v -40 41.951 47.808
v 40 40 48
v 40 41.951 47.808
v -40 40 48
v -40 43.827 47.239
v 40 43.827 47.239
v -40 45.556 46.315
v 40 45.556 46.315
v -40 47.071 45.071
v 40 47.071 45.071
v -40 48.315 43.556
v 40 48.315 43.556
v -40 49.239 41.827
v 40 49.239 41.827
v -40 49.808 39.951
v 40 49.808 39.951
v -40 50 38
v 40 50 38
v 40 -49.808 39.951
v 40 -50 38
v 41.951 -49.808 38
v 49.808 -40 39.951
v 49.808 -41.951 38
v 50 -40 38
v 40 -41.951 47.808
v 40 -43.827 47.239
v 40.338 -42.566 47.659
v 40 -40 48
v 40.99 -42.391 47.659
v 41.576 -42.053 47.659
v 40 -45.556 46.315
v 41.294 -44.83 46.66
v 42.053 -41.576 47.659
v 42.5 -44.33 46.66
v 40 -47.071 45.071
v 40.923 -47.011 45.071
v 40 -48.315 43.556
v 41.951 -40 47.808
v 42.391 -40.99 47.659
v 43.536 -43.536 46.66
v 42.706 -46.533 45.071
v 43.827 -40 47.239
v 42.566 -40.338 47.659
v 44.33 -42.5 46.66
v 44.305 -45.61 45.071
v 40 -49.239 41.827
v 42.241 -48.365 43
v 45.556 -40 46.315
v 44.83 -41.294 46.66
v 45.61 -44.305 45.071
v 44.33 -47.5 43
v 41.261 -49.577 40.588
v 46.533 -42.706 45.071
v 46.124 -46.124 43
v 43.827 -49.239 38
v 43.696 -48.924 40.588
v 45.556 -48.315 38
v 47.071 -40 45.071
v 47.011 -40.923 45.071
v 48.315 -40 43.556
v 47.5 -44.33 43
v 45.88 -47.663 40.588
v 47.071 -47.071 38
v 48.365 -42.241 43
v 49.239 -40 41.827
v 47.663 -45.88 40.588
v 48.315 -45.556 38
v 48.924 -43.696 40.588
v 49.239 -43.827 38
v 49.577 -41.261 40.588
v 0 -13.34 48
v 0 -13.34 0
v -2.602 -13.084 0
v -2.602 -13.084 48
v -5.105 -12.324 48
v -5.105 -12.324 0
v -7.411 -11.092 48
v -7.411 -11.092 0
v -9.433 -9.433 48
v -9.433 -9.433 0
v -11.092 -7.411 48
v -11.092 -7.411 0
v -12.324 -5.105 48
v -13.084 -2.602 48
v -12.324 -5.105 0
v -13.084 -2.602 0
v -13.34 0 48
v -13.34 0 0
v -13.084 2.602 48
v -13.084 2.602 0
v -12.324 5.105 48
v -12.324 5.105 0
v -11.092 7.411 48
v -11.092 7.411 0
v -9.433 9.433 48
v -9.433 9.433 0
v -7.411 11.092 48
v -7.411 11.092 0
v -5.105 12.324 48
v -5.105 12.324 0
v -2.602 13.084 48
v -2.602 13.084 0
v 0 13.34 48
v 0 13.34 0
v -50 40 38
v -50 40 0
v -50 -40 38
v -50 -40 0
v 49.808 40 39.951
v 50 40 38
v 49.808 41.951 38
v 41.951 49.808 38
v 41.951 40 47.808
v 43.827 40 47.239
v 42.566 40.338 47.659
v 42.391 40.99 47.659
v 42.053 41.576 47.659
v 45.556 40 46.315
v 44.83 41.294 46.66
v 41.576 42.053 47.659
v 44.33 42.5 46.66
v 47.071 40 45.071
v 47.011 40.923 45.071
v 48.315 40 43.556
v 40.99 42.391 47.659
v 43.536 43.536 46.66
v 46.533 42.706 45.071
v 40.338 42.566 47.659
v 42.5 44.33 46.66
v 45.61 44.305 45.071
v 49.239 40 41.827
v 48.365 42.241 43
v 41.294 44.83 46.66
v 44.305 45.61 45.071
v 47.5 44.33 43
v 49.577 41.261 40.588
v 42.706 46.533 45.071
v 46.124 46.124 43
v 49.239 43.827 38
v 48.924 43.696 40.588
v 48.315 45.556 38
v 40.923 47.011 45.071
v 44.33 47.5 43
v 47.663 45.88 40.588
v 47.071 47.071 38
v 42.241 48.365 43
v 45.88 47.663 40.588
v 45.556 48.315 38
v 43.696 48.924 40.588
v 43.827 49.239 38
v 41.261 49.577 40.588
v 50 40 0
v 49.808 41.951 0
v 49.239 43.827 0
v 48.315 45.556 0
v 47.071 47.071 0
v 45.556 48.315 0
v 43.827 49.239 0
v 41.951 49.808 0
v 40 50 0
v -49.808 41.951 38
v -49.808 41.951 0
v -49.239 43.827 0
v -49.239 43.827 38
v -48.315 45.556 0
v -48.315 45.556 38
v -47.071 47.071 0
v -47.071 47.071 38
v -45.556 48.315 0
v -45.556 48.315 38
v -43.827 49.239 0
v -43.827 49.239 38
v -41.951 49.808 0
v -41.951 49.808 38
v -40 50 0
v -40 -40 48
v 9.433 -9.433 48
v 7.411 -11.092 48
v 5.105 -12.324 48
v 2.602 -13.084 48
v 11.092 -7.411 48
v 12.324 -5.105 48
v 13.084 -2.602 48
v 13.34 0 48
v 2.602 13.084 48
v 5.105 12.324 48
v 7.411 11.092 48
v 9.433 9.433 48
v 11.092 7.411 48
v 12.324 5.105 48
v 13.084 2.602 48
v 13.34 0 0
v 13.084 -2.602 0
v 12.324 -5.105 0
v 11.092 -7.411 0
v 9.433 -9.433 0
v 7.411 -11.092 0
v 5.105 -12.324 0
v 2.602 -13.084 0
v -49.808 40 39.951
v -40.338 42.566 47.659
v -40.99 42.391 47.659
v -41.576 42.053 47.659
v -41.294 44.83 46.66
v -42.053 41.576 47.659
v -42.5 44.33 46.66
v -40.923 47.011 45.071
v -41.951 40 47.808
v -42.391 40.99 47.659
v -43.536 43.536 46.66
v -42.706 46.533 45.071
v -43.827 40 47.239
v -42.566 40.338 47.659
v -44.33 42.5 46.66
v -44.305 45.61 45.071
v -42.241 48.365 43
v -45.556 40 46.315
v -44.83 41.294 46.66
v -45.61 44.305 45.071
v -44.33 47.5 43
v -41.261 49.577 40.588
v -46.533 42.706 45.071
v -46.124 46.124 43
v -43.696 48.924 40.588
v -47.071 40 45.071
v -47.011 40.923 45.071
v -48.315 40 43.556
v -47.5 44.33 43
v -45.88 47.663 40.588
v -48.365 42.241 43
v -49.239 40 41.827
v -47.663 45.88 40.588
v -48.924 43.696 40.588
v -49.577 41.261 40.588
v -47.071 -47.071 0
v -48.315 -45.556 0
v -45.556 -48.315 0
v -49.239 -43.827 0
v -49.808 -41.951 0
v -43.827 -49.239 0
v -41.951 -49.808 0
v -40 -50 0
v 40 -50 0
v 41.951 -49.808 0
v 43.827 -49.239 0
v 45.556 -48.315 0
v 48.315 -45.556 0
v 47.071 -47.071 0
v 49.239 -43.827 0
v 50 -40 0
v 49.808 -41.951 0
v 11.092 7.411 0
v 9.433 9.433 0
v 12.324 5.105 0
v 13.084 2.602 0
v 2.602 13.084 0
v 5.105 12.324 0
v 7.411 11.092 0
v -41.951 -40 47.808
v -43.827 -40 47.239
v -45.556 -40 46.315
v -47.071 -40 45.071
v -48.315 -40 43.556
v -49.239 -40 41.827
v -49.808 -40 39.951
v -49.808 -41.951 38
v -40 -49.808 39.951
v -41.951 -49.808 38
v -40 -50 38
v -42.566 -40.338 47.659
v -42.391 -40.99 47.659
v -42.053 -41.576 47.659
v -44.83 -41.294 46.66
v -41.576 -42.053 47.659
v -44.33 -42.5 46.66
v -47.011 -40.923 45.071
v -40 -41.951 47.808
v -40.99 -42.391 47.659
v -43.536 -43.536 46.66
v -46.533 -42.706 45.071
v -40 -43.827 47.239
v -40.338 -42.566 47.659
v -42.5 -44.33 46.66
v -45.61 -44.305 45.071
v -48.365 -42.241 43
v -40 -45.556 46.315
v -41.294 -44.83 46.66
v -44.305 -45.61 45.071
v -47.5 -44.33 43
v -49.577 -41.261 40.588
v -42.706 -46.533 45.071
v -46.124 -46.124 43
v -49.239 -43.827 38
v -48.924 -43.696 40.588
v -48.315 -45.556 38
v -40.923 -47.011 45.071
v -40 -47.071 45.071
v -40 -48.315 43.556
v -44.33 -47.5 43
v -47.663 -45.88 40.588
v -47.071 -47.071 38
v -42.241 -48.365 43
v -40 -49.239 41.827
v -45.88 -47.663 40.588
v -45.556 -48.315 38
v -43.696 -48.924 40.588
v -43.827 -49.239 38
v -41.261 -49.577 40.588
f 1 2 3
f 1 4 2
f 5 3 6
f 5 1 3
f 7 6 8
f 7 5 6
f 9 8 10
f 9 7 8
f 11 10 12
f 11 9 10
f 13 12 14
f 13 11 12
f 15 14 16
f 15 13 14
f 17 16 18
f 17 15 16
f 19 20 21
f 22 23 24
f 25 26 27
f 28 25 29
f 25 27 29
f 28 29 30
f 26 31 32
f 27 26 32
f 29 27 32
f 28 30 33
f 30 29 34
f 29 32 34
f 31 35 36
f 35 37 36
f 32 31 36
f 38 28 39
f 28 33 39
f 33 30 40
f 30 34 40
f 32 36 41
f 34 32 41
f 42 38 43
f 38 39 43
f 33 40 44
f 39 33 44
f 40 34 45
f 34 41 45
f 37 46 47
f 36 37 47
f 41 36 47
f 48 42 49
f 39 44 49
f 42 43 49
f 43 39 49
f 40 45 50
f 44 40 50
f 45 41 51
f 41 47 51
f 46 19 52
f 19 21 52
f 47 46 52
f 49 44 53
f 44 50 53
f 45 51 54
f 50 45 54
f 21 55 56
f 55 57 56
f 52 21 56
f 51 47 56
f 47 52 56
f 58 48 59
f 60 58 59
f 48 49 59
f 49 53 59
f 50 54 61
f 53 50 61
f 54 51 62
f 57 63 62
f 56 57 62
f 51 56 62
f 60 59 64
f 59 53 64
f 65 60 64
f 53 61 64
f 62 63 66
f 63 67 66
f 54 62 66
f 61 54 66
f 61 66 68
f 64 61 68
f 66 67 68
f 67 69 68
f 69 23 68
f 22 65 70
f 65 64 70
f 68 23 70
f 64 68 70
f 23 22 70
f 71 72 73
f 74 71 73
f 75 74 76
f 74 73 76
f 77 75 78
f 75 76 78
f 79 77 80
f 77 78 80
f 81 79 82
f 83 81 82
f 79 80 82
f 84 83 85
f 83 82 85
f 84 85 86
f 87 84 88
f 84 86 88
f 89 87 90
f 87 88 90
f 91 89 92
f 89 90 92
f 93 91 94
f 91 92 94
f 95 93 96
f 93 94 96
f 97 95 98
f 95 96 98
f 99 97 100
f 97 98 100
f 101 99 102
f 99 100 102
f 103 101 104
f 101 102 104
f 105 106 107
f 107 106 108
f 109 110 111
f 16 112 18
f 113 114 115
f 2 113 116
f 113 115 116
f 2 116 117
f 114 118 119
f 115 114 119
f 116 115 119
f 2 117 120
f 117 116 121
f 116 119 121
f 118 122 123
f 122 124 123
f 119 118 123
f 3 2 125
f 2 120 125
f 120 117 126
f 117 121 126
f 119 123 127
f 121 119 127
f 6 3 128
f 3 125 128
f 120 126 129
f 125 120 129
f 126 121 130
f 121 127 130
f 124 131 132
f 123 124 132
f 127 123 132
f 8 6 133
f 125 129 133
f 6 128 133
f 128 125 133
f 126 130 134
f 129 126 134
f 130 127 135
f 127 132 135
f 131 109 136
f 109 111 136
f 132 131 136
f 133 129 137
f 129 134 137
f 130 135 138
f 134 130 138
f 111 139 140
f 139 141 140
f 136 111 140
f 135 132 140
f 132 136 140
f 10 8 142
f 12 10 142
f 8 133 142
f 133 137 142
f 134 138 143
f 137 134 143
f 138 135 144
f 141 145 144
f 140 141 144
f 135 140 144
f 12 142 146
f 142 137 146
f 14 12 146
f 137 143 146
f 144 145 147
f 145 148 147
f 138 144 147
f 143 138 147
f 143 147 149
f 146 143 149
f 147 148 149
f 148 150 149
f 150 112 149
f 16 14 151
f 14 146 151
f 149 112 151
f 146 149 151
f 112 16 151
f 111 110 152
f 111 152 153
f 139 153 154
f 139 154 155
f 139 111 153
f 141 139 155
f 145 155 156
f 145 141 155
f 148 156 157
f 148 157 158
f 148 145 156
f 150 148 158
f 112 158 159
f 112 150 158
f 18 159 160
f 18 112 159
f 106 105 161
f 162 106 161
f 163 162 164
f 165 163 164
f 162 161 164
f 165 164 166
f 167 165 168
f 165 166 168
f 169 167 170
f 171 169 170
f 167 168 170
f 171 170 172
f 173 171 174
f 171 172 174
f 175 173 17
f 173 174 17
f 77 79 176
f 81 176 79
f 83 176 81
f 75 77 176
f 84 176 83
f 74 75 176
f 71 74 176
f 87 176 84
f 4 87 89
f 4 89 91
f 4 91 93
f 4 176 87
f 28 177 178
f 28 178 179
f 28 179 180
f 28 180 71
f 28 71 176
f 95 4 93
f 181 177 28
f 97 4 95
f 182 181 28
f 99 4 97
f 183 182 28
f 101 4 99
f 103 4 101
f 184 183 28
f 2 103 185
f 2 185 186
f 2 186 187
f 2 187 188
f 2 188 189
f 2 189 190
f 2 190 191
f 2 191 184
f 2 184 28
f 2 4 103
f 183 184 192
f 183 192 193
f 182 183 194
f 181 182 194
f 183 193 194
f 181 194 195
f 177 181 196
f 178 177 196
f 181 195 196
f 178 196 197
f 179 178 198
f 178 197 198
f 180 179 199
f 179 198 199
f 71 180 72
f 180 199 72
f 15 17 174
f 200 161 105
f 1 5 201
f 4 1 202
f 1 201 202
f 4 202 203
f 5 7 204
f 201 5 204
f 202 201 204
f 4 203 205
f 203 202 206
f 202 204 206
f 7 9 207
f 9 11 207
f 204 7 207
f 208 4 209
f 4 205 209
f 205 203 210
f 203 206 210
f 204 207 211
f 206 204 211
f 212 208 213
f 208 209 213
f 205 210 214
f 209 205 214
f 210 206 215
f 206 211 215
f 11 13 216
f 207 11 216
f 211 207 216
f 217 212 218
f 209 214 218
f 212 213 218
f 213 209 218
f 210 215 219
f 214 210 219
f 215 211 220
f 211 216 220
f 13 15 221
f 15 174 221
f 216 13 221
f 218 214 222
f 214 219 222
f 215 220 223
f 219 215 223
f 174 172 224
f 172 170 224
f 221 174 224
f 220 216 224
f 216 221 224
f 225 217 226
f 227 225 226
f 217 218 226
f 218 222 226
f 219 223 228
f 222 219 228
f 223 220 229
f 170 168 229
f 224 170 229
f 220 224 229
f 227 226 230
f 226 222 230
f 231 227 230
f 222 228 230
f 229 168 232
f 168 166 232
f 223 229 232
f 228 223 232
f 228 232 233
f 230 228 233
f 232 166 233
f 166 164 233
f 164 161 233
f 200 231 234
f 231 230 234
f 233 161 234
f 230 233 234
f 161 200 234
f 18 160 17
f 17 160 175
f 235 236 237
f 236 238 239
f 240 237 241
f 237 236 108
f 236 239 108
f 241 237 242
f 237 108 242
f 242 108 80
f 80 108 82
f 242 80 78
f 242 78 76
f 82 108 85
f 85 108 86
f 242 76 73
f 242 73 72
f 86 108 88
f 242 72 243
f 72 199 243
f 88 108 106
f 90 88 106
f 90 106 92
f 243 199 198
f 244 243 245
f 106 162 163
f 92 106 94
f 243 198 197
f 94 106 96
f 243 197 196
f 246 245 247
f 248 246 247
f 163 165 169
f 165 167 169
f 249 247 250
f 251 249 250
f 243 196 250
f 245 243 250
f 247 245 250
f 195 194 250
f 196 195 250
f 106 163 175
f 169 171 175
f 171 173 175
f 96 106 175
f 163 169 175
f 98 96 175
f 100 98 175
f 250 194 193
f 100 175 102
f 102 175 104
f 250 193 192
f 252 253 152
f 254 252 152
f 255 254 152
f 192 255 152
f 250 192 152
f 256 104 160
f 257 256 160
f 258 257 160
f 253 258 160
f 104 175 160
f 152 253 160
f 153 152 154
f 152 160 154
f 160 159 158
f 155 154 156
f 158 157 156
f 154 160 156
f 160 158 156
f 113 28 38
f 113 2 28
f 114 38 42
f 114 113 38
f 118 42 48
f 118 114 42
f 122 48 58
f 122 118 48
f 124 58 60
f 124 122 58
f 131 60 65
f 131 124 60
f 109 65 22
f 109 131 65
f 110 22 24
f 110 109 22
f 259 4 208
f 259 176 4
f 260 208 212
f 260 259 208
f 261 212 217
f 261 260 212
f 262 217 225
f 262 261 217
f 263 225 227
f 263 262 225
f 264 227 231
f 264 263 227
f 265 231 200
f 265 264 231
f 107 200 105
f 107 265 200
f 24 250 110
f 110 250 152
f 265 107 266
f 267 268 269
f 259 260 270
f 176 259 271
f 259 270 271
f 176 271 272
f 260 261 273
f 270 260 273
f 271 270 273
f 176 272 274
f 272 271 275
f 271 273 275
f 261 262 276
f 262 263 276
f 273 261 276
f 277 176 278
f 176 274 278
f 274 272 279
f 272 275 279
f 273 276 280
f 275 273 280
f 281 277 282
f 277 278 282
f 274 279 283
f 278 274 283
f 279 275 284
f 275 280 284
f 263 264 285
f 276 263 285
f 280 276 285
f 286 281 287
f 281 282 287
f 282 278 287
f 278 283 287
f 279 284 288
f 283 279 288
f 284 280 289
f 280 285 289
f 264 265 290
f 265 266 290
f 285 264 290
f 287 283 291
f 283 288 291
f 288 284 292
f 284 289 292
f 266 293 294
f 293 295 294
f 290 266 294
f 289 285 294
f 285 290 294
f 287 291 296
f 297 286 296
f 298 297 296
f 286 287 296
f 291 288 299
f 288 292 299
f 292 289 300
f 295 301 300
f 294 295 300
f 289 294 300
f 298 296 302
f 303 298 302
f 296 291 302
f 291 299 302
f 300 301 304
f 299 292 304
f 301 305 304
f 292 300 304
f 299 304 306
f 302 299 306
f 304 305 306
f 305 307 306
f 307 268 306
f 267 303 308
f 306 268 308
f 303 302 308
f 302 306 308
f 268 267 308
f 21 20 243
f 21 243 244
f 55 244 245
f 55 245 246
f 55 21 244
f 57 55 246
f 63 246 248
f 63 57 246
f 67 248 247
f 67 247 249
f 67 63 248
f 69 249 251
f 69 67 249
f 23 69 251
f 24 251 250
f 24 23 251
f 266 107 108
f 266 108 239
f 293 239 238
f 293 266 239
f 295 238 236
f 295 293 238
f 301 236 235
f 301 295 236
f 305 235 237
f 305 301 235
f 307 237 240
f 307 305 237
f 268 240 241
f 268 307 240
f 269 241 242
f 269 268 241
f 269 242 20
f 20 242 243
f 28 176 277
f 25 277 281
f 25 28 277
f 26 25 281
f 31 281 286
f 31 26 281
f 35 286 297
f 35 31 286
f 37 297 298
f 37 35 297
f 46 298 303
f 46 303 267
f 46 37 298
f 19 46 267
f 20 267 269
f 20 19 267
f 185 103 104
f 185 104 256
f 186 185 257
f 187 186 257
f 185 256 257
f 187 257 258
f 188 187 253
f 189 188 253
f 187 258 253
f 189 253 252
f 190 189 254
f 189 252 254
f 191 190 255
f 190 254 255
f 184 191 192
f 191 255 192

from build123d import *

# Parameters (mm, degrees)
EXTRUDE_1_DEPTH = 48
FILLET_2_R      = 10
FILLET_3_R      = 10


with BuildPart() as part:
    # 草图1 → 凸台-拉伸1 (new body)
    with BuildSketch(Plane.XY):
        with BuildLine():
            Line((-50, 50), (-50, -50))
            Line((-50, -50), (0, -50))
            Line((0, -50), (0, -20.9))
            ThreePointArc((0, -20.9), (-20.9, 0), (0, 20.9))
            Line((0, 20.9), (0, 50))
            Line((0, 50), (-50, 50))
        make_face()
        with BuildLine():
            Line((50, 50), (0, 50))
            Line((0, 50), (0, 20.9))
            ThreePointArc((0, 20.9), (14.778531727, 14.778531727), (20.9, 0))
            Line((20.9, 0), (50, 0))
            Line((50, 0), (50, 50))
        make_face()
        with BuildLine():
            Line((0, -13.339839146), (0, -20.9))
            ThreePointArc((0, -20.9), (14.778531727, -14.778531727), (20.9, 0))
            Line((20.9, 0), (13.339839146, 0))
            ThreePointArc((13.339839146, 0), (9.43269072, -9.43269072), (0, -13.339839146))
        make_face()
        with BuildLine():
            ThreePointArc((20.9, 0), (14.778531727, 14.778531727), (0, 20.9))
            Line((0, 20.9), (0, 13.339839146))
            ThreePointArc((0, 13.339839146), (9.43269072, 9.43269072), (13.339839146, 0))
            Line((13.339839146, 0), (20.9, 0))
        make_face()
        with BuildLine():
            ThreePointArc((0, 20.9), (-20.9, 0), (0, -20.9))
            Line((0, -20.9), (0, -13.339839146))
            ThreePointArc((0, -13.339839146), (-13.339839146, 0), (0, 13.339839146))
            Line((0, 13.339839146), (0, 20.9))
        make_face()
        with BuildLine():
            Line((0, -20.9), (0, -50))
            Line((0, -50), (50, -50))
            Line((50, -50), (50, 0))
            Line((50, 0), (20.9, 0))
            ThreePointArc((20.9, 0), (14.778531727, -14.778531727), (0, -20.9))
        make_face()
    extrude(amount=EXTRUDE_1_DEPTH)

    # 圆角2
    fillet_2_edges = [part.edges().sort_by_distance(p)[0] for p in [
        (50, -50, 24),
        (-50, -50, 24),
        (-50, 50, 24),
        (50, 50, 24),
    ]]
    fillet(fillet_2_edges, radius=FILLET_2_R)

    # 圆角3
    fillet_3_edges = [part.edges().sort_by_distance(p)[0] for p in [
        (0, -50, 48),
        (-50, 0, 48),
        (50, 0, 48),
        (0, 50, 48),
        (-47.071067812, 47.071067812, 48),
        (47.071067812, 47.071067812, 48),
        (47.071067812, -47.071067812, 48),
        (-47.071067812, -47.071067812, 48),
    ]]
    fillet(fillet_3_edges, radius=FILLET_3_R)


solid = part.part
